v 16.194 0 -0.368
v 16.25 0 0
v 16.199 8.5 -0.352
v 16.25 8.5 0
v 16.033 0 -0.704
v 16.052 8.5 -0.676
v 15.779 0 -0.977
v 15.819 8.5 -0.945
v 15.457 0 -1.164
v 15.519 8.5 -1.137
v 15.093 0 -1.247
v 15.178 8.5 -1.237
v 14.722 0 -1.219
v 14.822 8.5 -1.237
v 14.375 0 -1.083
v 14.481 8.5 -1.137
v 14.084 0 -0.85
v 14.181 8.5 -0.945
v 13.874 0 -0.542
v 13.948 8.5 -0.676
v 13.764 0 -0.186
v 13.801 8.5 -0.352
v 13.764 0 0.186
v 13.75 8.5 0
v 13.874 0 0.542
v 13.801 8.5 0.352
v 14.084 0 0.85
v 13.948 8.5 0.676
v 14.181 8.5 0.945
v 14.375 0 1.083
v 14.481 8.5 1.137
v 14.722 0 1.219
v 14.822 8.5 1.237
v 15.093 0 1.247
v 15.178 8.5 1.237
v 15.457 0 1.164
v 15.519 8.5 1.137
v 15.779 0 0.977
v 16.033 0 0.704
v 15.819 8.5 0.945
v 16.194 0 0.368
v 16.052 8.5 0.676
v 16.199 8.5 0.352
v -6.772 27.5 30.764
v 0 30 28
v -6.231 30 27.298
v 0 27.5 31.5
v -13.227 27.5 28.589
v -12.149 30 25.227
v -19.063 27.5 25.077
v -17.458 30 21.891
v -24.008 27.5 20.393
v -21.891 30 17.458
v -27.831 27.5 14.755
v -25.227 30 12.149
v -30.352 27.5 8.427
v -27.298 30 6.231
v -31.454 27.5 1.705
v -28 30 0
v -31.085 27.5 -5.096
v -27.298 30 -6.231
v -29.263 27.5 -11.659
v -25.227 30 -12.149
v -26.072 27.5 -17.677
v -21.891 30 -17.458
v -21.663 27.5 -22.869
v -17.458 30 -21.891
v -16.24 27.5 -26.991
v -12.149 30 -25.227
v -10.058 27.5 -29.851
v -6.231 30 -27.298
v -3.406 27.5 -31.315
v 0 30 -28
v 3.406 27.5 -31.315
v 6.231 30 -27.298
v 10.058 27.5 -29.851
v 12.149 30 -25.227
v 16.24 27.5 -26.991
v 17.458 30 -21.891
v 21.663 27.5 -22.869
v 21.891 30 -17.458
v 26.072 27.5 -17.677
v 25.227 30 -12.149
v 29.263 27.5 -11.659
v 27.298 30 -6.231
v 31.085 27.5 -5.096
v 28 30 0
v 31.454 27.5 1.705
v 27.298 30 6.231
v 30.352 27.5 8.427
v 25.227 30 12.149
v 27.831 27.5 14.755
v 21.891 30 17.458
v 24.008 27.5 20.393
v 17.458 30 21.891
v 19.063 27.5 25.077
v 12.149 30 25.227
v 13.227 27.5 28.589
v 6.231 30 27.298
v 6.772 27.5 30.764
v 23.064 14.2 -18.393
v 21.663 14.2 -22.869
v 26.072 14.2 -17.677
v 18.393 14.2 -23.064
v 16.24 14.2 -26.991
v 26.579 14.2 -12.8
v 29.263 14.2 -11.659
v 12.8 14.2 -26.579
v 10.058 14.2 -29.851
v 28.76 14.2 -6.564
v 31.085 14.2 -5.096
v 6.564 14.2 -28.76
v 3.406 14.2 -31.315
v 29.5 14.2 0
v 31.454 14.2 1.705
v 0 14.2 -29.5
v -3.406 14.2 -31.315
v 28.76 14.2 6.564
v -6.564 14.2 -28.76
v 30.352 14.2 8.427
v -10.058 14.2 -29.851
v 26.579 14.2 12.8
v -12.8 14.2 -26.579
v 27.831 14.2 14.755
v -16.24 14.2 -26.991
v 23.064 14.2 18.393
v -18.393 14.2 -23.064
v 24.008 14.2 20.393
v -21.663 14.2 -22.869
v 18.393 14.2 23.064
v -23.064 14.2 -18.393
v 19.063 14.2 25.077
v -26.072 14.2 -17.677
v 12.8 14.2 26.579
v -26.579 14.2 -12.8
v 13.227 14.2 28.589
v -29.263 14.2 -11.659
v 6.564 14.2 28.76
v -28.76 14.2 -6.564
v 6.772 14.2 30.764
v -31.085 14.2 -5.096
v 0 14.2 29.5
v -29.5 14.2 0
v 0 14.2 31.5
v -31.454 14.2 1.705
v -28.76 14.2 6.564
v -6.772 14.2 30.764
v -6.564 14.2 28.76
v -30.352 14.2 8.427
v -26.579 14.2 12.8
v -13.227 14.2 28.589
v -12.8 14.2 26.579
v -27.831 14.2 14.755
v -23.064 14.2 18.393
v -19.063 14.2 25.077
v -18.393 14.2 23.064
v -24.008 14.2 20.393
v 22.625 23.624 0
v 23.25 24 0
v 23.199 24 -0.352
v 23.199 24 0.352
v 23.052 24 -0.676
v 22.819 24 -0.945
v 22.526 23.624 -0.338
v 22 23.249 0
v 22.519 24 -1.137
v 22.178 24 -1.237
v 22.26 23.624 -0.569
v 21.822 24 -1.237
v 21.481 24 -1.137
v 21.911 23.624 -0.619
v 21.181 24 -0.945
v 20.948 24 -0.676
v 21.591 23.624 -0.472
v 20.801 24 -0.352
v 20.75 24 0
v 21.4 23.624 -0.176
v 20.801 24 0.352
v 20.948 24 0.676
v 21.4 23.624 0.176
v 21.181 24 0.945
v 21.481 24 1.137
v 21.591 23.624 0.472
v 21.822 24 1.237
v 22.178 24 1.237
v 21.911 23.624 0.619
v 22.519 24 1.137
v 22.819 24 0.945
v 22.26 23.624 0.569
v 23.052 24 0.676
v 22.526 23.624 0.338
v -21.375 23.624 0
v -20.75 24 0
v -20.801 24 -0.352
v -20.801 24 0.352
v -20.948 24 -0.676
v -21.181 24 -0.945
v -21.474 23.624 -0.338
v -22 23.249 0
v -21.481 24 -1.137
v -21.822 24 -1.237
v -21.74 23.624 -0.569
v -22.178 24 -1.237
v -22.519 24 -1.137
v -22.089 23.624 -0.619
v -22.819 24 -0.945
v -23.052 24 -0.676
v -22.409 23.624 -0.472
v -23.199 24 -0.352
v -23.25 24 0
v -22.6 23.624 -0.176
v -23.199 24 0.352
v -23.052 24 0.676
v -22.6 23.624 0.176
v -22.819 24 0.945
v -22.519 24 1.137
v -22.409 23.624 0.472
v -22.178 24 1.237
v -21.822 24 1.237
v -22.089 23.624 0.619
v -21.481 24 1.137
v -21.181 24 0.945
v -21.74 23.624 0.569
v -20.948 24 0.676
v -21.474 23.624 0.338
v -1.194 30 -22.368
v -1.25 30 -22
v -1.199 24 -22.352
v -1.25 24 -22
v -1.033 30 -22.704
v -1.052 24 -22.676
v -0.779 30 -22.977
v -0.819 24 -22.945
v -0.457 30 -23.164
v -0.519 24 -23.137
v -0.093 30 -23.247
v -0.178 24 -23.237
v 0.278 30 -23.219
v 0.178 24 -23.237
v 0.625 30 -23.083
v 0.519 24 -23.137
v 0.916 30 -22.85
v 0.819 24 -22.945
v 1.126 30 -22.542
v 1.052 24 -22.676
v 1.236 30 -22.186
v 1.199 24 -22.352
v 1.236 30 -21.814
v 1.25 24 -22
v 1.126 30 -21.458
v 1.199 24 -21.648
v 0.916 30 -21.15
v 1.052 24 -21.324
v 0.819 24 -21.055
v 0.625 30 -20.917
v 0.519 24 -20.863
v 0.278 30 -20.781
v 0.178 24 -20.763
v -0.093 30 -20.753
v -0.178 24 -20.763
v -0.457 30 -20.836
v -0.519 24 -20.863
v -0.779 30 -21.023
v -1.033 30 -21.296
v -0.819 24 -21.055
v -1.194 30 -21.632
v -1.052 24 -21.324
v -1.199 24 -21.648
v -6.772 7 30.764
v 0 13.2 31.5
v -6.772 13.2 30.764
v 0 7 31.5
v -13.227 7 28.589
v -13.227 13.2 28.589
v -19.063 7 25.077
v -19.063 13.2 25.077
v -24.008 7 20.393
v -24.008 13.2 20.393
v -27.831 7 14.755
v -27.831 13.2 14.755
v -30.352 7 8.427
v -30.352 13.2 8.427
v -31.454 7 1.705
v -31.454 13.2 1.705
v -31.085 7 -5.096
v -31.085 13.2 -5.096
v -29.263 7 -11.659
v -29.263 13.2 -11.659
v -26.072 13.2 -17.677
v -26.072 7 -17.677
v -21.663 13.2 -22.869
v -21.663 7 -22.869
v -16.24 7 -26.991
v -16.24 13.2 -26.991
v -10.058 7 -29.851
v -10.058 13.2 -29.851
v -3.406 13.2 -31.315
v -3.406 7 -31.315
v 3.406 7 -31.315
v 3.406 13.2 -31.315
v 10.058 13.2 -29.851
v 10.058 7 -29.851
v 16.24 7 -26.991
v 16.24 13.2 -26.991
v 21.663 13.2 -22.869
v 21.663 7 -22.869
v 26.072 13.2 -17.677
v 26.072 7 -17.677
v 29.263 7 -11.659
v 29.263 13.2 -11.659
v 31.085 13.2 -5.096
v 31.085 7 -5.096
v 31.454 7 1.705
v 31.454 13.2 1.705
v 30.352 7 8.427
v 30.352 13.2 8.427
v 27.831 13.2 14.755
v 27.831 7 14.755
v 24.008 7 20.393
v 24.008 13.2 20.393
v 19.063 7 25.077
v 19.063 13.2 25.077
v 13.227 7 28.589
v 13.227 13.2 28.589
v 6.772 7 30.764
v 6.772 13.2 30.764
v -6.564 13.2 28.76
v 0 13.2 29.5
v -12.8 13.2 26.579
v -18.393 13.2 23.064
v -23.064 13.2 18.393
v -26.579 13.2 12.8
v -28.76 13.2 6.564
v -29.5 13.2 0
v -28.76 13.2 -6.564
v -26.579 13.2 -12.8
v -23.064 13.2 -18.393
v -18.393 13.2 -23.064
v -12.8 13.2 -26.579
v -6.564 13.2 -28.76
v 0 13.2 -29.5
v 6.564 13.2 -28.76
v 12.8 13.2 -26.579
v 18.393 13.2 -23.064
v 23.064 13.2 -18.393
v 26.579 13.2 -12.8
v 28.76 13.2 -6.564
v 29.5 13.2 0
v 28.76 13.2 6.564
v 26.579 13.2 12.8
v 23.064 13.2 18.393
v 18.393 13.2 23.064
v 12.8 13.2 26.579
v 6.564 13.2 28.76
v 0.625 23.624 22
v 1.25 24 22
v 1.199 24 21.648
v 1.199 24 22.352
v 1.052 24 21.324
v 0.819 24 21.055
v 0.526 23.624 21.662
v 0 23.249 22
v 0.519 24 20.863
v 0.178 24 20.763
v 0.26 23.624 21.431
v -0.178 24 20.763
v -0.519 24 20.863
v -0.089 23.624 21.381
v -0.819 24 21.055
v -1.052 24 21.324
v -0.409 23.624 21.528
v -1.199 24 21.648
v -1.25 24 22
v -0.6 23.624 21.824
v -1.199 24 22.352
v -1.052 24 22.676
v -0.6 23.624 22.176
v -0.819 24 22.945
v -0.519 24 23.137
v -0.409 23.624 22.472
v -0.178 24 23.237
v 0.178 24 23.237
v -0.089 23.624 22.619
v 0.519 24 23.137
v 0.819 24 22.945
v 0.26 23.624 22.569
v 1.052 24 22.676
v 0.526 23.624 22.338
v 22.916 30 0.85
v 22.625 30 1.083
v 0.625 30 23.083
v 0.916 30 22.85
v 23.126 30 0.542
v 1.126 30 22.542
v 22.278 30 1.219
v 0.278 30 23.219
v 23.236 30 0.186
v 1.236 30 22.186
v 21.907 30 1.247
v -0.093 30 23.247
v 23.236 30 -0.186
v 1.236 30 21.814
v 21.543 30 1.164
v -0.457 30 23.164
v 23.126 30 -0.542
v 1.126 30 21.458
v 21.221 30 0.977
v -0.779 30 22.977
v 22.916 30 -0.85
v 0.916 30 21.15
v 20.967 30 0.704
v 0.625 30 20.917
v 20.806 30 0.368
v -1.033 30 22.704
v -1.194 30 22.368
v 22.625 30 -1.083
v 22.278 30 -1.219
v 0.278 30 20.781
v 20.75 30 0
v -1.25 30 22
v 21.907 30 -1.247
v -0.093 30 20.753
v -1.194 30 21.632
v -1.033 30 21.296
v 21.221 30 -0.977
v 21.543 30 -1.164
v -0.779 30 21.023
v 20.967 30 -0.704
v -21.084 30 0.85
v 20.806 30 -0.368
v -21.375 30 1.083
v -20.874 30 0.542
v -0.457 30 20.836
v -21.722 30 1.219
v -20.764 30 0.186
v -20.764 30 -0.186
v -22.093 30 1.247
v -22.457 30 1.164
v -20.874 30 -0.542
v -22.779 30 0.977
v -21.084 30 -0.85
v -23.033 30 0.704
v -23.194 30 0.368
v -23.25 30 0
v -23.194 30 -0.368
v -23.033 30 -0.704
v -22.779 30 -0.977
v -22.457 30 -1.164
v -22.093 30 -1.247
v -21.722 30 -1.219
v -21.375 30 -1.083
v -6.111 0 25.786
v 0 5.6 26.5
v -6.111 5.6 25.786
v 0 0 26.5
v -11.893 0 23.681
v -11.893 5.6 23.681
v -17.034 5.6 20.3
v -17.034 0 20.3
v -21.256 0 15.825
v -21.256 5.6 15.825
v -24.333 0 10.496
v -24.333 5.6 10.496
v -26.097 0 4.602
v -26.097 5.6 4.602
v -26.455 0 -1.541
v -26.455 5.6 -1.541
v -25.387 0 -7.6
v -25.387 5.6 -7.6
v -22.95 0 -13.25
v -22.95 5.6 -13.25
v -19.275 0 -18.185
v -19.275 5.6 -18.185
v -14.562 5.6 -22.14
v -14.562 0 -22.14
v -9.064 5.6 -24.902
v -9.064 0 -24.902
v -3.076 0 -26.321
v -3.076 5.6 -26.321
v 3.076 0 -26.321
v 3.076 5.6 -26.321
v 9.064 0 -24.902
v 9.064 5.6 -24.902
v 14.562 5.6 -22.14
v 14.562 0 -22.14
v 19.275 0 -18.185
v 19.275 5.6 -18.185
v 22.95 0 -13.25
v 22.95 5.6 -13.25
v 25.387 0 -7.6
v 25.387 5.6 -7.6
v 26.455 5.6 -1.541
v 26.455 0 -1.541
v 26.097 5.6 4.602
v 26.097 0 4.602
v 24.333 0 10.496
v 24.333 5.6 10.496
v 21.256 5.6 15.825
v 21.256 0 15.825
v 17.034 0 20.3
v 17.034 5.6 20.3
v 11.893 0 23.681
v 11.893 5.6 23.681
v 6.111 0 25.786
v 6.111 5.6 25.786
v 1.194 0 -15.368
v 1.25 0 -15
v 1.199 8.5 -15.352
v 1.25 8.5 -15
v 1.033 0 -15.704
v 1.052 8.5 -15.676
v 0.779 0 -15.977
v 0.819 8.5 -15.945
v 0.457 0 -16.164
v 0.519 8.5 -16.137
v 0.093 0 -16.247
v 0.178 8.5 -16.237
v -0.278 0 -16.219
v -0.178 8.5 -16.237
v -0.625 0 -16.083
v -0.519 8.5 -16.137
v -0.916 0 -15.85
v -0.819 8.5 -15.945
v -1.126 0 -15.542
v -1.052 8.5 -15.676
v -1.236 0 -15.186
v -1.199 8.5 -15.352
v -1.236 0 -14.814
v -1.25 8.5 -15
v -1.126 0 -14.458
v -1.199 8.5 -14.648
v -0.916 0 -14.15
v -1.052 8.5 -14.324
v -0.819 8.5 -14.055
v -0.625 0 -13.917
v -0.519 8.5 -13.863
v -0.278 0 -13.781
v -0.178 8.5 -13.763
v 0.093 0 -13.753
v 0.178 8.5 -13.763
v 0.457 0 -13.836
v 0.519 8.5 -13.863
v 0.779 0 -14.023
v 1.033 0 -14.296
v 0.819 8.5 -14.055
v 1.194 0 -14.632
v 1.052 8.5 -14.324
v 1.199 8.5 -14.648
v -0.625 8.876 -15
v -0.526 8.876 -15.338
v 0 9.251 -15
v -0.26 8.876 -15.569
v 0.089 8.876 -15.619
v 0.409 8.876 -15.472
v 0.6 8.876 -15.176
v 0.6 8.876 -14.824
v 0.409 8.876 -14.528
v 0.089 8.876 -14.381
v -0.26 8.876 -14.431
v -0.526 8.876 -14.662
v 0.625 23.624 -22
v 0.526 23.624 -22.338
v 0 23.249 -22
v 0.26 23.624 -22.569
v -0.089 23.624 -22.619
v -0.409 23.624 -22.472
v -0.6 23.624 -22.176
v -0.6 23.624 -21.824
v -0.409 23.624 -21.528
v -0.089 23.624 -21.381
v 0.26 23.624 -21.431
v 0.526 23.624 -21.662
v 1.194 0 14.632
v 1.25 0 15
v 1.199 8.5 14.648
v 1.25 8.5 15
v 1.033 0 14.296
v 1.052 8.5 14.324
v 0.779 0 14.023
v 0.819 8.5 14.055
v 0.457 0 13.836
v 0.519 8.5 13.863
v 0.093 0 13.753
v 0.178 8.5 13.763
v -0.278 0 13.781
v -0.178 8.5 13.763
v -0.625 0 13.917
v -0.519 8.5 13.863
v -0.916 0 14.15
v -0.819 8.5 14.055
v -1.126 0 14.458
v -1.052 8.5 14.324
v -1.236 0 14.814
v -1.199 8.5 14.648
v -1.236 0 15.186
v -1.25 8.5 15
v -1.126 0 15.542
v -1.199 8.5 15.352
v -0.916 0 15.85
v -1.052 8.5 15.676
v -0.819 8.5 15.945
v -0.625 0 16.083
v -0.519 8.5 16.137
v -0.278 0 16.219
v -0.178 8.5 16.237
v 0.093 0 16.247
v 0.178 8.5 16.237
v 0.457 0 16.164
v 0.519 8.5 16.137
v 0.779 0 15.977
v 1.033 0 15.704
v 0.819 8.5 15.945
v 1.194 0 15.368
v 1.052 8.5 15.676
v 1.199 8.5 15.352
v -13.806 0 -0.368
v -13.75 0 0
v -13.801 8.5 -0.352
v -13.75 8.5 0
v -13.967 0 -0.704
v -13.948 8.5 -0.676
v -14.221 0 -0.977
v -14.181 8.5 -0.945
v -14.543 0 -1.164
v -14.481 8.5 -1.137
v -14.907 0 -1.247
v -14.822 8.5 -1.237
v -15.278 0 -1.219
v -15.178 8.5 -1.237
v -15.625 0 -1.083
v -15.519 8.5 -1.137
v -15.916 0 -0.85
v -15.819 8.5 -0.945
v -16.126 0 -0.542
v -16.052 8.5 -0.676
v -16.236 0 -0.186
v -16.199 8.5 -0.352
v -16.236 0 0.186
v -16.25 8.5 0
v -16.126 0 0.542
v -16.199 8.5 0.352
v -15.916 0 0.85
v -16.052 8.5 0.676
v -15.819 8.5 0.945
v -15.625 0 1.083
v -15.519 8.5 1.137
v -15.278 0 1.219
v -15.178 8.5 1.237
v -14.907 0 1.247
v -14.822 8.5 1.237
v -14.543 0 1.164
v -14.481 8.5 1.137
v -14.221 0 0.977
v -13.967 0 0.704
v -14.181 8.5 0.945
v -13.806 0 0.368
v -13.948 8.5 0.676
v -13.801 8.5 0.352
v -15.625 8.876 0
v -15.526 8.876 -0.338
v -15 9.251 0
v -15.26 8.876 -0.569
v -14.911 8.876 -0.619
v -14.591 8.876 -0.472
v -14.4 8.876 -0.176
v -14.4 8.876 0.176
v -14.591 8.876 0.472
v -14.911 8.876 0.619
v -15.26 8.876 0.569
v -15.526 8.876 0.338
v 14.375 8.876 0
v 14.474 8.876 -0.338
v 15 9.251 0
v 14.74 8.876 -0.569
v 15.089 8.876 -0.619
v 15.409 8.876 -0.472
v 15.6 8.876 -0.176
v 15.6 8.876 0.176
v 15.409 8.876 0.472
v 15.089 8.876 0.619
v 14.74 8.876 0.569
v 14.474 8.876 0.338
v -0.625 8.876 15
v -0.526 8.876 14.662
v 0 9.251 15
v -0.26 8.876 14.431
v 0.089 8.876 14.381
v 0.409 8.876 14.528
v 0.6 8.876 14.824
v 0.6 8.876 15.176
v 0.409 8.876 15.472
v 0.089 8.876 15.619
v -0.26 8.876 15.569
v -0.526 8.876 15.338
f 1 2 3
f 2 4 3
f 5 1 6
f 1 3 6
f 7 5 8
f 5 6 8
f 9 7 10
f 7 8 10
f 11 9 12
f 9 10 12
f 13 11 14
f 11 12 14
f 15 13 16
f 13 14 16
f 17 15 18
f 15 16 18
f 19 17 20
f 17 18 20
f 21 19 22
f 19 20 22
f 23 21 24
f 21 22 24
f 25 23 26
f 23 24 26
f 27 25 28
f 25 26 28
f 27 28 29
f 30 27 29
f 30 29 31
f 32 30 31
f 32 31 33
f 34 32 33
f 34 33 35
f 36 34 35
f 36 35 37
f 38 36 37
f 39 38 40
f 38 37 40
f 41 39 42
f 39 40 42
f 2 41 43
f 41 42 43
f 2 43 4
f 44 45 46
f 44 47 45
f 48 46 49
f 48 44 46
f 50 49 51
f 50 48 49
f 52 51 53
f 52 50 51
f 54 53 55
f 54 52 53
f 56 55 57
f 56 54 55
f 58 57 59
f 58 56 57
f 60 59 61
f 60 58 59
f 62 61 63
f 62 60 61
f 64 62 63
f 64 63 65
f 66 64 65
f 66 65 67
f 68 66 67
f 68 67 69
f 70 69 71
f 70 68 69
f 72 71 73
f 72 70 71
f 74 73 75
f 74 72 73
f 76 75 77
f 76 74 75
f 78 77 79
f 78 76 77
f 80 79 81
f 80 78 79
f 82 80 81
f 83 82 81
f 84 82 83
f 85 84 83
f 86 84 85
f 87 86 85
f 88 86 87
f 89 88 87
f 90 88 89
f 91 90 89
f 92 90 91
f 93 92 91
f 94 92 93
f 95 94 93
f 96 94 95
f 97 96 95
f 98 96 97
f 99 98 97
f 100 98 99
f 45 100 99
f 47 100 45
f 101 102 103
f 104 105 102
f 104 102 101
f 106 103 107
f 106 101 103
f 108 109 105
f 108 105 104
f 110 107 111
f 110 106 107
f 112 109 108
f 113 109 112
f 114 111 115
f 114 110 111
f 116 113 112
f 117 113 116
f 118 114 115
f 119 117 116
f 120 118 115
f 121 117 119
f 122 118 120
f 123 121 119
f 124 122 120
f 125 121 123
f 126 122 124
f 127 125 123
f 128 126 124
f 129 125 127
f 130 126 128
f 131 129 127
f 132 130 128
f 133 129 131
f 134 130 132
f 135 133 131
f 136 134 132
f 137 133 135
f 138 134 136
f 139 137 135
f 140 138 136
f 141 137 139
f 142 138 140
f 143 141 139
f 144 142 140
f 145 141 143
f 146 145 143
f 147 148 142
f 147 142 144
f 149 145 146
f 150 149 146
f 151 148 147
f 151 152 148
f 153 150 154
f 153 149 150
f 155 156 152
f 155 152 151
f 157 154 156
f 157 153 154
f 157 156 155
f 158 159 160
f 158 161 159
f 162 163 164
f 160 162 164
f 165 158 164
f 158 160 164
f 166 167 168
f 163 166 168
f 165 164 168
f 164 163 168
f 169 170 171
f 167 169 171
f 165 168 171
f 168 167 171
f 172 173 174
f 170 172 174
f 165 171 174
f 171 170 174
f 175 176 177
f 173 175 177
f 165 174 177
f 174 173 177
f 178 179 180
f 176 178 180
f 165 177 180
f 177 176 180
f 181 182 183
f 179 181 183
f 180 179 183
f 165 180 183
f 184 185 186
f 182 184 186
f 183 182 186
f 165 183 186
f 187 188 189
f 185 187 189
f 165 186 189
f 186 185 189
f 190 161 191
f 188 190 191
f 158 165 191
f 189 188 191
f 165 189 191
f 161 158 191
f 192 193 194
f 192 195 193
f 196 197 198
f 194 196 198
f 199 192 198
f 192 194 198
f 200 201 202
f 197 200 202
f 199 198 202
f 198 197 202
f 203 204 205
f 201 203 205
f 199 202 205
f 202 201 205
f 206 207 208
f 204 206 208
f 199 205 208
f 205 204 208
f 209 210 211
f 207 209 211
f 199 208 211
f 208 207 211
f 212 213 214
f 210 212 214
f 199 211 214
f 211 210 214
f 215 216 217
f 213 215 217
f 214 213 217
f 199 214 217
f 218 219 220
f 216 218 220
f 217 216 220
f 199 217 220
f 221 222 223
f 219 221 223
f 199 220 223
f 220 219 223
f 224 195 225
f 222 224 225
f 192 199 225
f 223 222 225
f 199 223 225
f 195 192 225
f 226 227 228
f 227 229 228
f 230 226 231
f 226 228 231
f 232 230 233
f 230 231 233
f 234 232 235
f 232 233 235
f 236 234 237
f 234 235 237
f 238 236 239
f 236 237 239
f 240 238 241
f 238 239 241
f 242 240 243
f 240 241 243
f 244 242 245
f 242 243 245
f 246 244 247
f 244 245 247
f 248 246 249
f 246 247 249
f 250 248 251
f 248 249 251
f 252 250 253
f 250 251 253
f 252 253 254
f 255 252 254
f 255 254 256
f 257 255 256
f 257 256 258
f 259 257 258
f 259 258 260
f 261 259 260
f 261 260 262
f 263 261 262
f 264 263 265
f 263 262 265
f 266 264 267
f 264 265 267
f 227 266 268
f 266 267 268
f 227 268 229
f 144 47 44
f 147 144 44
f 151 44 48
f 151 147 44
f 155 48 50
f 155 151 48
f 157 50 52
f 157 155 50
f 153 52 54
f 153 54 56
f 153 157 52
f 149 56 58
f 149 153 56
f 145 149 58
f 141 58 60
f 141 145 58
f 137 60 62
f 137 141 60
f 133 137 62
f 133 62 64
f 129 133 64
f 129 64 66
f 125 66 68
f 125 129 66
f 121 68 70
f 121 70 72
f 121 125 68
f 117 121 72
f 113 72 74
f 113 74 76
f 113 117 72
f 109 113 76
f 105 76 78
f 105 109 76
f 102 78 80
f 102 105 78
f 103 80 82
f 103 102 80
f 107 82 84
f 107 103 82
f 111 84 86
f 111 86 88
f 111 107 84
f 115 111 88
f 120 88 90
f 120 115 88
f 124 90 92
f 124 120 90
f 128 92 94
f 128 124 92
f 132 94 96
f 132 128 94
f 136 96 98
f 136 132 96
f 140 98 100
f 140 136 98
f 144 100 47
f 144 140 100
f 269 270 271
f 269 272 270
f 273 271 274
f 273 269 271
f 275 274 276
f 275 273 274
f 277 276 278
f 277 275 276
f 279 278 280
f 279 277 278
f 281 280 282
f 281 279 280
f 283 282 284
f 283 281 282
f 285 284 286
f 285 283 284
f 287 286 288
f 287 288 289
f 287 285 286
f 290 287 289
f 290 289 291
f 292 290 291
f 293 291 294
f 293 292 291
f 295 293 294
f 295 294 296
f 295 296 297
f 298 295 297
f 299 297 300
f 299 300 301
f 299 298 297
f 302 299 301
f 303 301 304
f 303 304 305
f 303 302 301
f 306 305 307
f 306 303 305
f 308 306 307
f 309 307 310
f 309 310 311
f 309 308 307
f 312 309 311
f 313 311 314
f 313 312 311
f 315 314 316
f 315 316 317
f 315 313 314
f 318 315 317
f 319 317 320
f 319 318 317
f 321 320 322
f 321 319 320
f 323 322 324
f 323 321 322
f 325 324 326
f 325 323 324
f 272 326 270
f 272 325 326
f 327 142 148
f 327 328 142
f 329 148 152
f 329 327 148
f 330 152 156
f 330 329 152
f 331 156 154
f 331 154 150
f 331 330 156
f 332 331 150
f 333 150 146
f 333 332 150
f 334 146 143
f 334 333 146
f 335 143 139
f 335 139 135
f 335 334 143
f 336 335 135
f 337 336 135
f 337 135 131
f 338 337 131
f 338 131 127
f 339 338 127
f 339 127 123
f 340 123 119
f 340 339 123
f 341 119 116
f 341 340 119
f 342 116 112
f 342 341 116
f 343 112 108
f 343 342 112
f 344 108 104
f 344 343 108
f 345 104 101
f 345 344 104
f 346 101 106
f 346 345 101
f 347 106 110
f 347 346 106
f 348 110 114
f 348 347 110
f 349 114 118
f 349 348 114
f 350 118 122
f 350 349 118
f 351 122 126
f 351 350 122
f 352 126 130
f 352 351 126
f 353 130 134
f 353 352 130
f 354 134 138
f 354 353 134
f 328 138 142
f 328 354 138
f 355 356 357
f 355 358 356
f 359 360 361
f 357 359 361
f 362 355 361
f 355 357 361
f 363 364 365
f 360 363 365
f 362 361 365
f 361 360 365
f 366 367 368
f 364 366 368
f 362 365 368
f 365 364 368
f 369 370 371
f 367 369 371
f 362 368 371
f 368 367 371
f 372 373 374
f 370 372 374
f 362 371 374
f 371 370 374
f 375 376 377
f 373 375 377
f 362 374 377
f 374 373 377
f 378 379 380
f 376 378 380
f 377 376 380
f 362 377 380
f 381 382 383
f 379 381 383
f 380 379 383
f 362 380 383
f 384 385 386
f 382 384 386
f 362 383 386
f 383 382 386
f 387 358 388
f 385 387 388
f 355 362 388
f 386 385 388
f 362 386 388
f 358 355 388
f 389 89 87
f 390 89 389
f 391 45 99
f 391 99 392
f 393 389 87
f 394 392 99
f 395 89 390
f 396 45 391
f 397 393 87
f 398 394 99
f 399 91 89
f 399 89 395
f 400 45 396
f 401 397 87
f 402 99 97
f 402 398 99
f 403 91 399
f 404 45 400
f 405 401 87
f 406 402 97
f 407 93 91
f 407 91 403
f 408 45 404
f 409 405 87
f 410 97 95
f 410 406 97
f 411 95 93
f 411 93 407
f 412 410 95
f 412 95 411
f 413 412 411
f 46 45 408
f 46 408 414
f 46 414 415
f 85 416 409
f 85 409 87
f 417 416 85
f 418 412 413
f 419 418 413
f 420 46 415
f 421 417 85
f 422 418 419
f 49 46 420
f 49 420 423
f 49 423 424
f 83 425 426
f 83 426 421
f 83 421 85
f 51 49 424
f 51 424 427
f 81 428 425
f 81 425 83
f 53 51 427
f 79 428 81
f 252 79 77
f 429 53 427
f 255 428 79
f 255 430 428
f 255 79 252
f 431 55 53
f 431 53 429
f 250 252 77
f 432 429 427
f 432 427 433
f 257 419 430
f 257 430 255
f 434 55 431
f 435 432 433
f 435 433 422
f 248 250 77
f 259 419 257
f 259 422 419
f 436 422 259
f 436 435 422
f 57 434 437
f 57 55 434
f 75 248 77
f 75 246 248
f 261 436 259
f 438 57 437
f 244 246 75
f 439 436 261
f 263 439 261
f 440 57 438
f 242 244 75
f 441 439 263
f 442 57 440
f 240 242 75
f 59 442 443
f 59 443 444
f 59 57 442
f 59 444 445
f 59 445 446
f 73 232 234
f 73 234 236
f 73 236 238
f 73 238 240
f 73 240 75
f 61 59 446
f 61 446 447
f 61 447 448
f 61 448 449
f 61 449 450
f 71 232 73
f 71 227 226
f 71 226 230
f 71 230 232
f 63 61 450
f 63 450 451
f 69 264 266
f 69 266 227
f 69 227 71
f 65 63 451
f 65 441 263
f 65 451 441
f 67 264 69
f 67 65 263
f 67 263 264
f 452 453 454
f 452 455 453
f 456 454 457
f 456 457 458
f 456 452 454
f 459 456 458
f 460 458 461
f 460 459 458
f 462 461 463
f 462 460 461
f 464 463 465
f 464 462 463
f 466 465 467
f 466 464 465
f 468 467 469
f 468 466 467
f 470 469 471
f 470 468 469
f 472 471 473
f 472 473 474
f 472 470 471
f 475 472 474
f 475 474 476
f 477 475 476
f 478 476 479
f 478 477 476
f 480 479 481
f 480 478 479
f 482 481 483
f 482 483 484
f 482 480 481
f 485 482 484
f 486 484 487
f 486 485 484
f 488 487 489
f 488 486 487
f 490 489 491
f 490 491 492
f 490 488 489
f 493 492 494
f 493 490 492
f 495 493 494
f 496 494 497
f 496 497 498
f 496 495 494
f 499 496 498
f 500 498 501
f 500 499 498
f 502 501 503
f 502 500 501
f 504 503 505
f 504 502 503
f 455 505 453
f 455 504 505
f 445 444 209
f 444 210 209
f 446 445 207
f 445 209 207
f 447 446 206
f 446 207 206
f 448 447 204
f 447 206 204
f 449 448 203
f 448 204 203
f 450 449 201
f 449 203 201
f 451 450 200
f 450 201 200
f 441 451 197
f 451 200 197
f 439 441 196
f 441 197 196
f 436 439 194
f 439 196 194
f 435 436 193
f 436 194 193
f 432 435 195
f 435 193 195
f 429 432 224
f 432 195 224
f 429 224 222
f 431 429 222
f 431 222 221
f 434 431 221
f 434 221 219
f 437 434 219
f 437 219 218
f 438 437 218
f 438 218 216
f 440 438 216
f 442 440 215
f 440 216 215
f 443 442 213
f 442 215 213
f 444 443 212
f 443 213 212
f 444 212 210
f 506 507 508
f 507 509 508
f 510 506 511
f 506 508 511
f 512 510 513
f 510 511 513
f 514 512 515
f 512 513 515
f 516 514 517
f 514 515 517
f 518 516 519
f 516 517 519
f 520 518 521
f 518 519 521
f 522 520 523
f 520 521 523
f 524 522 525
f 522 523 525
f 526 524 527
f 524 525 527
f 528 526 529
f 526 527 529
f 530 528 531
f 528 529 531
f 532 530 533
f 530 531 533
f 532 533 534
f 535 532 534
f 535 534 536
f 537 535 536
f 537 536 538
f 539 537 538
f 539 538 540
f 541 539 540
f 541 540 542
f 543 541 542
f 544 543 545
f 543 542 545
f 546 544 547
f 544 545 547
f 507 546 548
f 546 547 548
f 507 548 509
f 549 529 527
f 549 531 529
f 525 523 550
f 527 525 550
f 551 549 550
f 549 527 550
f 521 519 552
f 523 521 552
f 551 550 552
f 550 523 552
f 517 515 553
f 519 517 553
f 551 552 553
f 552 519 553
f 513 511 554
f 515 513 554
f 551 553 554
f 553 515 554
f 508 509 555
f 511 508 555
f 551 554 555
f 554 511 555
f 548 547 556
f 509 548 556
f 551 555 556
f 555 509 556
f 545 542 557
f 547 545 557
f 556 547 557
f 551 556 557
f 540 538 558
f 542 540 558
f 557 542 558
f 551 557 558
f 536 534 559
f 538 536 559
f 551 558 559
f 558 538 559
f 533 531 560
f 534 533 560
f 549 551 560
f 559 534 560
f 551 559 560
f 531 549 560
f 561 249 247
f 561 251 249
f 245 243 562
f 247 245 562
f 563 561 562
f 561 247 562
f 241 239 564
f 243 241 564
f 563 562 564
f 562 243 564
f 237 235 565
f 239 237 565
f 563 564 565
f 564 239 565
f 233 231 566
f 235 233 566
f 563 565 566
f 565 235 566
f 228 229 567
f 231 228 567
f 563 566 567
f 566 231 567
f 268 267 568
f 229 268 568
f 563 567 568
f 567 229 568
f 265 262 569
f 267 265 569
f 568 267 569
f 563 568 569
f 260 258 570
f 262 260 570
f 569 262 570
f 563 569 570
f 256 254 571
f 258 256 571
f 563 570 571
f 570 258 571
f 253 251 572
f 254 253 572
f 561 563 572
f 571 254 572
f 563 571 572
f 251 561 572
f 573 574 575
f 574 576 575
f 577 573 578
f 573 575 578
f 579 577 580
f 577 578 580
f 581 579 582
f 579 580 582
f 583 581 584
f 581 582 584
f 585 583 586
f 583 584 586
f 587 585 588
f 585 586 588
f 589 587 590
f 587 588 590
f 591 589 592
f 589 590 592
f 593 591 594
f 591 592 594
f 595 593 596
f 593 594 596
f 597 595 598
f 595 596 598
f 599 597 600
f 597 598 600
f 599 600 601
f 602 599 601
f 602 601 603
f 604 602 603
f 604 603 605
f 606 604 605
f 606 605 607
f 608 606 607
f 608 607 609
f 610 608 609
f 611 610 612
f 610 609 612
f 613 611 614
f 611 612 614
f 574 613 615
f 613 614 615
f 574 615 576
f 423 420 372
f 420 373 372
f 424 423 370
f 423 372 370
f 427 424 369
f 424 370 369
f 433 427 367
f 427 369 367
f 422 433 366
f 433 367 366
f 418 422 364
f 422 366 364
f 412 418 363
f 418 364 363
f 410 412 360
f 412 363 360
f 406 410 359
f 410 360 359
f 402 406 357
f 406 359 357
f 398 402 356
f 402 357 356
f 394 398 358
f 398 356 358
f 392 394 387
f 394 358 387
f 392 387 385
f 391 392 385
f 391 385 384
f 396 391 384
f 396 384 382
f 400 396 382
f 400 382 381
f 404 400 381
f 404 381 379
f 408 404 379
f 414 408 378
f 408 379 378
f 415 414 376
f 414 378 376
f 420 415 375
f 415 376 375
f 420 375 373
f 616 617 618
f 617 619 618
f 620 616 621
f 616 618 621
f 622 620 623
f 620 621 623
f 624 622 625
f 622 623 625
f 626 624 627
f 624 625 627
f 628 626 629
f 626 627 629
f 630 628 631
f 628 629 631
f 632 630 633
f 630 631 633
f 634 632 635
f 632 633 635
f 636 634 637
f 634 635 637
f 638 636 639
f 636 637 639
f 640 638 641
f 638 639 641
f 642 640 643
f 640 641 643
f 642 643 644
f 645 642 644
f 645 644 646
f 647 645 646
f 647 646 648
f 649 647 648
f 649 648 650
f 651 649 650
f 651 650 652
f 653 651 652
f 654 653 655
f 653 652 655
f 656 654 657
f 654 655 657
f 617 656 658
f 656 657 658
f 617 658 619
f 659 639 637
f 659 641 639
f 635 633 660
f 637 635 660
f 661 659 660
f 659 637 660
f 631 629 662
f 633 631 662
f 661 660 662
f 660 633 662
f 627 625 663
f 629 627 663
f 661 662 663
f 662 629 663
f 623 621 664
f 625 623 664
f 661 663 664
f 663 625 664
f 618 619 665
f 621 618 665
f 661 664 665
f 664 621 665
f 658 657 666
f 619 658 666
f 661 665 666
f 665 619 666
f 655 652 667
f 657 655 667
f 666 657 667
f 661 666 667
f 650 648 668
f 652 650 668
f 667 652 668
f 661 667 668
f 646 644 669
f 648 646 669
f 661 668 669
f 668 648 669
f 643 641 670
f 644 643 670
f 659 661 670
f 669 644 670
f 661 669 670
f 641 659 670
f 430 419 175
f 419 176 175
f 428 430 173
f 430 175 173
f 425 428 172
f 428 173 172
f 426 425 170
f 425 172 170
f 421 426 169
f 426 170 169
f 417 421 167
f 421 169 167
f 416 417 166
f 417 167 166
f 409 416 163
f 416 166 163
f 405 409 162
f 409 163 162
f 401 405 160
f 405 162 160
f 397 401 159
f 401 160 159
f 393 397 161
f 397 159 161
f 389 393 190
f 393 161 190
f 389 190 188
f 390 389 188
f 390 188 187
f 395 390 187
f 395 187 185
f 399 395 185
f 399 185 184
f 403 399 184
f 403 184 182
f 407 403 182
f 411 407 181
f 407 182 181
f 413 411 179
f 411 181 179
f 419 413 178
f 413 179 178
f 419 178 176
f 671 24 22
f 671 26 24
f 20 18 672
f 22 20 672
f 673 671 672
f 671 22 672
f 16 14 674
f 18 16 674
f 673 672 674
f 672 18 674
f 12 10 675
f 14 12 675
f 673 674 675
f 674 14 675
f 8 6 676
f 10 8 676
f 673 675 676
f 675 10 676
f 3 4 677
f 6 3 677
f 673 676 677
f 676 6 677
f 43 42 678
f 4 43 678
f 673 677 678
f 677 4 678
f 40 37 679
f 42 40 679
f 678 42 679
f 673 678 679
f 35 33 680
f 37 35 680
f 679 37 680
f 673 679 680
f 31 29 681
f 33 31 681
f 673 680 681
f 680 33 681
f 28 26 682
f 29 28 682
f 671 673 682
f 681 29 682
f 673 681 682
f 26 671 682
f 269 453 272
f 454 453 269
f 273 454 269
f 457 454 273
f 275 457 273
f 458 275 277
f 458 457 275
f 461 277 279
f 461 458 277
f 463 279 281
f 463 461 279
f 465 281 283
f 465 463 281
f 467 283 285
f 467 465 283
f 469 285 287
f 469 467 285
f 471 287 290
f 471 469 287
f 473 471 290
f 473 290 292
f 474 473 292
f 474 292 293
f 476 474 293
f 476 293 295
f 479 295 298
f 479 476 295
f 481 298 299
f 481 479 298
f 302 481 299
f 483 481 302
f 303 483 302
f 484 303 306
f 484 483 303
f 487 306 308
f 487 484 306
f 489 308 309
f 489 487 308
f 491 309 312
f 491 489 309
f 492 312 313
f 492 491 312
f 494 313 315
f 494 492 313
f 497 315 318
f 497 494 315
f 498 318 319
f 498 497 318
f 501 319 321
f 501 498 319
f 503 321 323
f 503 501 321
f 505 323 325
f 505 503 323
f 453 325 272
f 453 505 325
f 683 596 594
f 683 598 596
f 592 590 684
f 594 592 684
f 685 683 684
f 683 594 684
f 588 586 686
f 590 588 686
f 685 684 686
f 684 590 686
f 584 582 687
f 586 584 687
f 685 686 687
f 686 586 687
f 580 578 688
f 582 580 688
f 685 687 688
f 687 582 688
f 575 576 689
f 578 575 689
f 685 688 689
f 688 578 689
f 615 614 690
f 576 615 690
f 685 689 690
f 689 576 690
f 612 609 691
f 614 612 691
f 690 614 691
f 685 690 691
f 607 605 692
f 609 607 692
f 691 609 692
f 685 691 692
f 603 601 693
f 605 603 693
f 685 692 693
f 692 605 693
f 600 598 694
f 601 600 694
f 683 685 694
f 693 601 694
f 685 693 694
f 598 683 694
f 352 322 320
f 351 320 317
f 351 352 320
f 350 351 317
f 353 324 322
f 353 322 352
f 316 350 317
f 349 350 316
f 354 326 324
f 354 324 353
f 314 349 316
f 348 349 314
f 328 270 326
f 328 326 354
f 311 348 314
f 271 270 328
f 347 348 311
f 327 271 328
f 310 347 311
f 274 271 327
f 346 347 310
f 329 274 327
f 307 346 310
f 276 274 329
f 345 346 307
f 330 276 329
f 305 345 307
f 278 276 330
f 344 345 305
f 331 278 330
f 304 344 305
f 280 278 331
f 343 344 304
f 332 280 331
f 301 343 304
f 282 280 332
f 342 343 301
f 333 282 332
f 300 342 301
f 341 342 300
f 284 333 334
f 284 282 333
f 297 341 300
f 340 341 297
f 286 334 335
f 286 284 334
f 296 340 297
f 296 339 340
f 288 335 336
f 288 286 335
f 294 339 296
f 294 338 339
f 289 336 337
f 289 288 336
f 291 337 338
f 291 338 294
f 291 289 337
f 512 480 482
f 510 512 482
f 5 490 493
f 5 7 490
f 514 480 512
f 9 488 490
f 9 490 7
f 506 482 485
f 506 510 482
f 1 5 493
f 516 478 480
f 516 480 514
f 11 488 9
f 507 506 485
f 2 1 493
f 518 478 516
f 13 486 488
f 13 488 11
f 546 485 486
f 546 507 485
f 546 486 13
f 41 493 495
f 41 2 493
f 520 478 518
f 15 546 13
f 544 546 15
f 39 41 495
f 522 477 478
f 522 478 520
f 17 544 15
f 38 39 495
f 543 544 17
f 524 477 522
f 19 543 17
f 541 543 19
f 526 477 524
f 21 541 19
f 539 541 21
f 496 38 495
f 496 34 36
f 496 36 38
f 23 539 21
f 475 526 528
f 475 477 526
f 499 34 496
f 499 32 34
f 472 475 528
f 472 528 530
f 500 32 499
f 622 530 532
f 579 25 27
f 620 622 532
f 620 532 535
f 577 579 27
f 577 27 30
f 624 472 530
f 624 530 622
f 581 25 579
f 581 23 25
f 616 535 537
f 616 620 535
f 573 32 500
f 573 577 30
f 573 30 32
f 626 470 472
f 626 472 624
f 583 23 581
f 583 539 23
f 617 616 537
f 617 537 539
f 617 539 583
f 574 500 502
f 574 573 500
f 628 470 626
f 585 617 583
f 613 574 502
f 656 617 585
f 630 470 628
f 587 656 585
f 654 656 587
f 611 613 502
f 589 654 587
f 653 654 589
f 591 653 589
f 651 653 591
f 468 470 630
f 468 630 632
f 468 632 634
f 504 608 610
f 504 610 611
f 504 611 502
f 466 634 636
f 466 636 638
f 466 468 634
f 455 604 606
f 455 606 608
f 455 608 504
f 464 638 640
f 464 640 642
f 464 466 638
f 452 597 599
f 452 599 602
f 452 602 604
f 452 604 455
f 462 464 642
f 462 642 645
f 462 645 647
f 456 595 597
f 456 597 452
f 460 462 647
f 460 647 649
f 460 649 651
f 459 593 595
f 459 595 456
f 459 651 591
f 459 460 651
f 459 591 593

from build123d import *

# Parameters (mm, degrees)
M3X0_5_TAPPED_HOLE1_D     = 2.5
M3X0_5_TAPPED_HOLE1_DEPTH = 6
M3X0_5_TAPPED_HOLE1_TIP   = 0.751075774
M3X0_5_TAPPED_HOLE2_D     = 2.5
M3X0_5_TAPPED_HOLE2_DEPTH = 8.5
M3X0_5_TAPPED_HOLE2_TIP   = 0.751075774


with BuildPart() as part:
    # Sketch1 → Revolve1 (revolve)
    with BuildSketch(Plane.XY):
        Polygon((0, 0), (0, 30), (-28, 30), (-31.5, 27.5), (-31.5, 14.2), (-29.5, 14.2), (-29.5, 13.2), (-31.5, 13.2), (-31.5, 7), (-26.5, 5.6), (-26.5, 0), align=None)
    revolve(axis=Axis((0, 0, 0), (0, -1, 0)))

    # M3x0.5 Tapped Hole1
    with Locations(Plane(origin=(0, 30, 0), x_dir=(1, 0, 0), z_dir=(0, 1, 0))):
        with Locations((0, 22), (0, -22), (22, 0), (-22, 0)):
            Hole(M3X0_5_TAPPED_HOLE1_D / 2, depth=M3X0_5_TAPPED_HOLE1_DEPTH)
            with Locations((0, 0, -(M3X0_5_TAPPED_HOLE1_DEPTH + M3X0_5_TAPPED_HOLE1_TIP / 2))):  # 118° drill point
                Cone(0, M3X0_5_TAPPED_HOLE1_D / 2, M3X0_5_TAPPED_HOLE1_TIP, mode=Mode.SUBTRACT)

    # M3x0.5 Tapped Hole2
    with Locations(Plane(origin=(0, 0, 0), x_dir=(-1, 0, 0), z_dir=(0, -1, 0))):
        with Locations((0, 15), (0, -15), (15, 0), (-15, 0)):
            Hole(M3X0_5_TAPPED_HOLE2_D / 2, depth=M3X0_5_TAPPED_HOLE2_DEPTH)
            with Locations((0, 0, -(M3X0_5_TAPPED_HOLE2_DEPTH + M3X0_5_TAPPED_HOLE2_TIP / 2))):  # 118° drill point
                Cone(0, M3X0_5_TAPPED_HOLE2_D / 2, M3X0_5_TAPPED_HOLE2_TIP, mode=Mode.SUBTRACT)


solid = part.part
